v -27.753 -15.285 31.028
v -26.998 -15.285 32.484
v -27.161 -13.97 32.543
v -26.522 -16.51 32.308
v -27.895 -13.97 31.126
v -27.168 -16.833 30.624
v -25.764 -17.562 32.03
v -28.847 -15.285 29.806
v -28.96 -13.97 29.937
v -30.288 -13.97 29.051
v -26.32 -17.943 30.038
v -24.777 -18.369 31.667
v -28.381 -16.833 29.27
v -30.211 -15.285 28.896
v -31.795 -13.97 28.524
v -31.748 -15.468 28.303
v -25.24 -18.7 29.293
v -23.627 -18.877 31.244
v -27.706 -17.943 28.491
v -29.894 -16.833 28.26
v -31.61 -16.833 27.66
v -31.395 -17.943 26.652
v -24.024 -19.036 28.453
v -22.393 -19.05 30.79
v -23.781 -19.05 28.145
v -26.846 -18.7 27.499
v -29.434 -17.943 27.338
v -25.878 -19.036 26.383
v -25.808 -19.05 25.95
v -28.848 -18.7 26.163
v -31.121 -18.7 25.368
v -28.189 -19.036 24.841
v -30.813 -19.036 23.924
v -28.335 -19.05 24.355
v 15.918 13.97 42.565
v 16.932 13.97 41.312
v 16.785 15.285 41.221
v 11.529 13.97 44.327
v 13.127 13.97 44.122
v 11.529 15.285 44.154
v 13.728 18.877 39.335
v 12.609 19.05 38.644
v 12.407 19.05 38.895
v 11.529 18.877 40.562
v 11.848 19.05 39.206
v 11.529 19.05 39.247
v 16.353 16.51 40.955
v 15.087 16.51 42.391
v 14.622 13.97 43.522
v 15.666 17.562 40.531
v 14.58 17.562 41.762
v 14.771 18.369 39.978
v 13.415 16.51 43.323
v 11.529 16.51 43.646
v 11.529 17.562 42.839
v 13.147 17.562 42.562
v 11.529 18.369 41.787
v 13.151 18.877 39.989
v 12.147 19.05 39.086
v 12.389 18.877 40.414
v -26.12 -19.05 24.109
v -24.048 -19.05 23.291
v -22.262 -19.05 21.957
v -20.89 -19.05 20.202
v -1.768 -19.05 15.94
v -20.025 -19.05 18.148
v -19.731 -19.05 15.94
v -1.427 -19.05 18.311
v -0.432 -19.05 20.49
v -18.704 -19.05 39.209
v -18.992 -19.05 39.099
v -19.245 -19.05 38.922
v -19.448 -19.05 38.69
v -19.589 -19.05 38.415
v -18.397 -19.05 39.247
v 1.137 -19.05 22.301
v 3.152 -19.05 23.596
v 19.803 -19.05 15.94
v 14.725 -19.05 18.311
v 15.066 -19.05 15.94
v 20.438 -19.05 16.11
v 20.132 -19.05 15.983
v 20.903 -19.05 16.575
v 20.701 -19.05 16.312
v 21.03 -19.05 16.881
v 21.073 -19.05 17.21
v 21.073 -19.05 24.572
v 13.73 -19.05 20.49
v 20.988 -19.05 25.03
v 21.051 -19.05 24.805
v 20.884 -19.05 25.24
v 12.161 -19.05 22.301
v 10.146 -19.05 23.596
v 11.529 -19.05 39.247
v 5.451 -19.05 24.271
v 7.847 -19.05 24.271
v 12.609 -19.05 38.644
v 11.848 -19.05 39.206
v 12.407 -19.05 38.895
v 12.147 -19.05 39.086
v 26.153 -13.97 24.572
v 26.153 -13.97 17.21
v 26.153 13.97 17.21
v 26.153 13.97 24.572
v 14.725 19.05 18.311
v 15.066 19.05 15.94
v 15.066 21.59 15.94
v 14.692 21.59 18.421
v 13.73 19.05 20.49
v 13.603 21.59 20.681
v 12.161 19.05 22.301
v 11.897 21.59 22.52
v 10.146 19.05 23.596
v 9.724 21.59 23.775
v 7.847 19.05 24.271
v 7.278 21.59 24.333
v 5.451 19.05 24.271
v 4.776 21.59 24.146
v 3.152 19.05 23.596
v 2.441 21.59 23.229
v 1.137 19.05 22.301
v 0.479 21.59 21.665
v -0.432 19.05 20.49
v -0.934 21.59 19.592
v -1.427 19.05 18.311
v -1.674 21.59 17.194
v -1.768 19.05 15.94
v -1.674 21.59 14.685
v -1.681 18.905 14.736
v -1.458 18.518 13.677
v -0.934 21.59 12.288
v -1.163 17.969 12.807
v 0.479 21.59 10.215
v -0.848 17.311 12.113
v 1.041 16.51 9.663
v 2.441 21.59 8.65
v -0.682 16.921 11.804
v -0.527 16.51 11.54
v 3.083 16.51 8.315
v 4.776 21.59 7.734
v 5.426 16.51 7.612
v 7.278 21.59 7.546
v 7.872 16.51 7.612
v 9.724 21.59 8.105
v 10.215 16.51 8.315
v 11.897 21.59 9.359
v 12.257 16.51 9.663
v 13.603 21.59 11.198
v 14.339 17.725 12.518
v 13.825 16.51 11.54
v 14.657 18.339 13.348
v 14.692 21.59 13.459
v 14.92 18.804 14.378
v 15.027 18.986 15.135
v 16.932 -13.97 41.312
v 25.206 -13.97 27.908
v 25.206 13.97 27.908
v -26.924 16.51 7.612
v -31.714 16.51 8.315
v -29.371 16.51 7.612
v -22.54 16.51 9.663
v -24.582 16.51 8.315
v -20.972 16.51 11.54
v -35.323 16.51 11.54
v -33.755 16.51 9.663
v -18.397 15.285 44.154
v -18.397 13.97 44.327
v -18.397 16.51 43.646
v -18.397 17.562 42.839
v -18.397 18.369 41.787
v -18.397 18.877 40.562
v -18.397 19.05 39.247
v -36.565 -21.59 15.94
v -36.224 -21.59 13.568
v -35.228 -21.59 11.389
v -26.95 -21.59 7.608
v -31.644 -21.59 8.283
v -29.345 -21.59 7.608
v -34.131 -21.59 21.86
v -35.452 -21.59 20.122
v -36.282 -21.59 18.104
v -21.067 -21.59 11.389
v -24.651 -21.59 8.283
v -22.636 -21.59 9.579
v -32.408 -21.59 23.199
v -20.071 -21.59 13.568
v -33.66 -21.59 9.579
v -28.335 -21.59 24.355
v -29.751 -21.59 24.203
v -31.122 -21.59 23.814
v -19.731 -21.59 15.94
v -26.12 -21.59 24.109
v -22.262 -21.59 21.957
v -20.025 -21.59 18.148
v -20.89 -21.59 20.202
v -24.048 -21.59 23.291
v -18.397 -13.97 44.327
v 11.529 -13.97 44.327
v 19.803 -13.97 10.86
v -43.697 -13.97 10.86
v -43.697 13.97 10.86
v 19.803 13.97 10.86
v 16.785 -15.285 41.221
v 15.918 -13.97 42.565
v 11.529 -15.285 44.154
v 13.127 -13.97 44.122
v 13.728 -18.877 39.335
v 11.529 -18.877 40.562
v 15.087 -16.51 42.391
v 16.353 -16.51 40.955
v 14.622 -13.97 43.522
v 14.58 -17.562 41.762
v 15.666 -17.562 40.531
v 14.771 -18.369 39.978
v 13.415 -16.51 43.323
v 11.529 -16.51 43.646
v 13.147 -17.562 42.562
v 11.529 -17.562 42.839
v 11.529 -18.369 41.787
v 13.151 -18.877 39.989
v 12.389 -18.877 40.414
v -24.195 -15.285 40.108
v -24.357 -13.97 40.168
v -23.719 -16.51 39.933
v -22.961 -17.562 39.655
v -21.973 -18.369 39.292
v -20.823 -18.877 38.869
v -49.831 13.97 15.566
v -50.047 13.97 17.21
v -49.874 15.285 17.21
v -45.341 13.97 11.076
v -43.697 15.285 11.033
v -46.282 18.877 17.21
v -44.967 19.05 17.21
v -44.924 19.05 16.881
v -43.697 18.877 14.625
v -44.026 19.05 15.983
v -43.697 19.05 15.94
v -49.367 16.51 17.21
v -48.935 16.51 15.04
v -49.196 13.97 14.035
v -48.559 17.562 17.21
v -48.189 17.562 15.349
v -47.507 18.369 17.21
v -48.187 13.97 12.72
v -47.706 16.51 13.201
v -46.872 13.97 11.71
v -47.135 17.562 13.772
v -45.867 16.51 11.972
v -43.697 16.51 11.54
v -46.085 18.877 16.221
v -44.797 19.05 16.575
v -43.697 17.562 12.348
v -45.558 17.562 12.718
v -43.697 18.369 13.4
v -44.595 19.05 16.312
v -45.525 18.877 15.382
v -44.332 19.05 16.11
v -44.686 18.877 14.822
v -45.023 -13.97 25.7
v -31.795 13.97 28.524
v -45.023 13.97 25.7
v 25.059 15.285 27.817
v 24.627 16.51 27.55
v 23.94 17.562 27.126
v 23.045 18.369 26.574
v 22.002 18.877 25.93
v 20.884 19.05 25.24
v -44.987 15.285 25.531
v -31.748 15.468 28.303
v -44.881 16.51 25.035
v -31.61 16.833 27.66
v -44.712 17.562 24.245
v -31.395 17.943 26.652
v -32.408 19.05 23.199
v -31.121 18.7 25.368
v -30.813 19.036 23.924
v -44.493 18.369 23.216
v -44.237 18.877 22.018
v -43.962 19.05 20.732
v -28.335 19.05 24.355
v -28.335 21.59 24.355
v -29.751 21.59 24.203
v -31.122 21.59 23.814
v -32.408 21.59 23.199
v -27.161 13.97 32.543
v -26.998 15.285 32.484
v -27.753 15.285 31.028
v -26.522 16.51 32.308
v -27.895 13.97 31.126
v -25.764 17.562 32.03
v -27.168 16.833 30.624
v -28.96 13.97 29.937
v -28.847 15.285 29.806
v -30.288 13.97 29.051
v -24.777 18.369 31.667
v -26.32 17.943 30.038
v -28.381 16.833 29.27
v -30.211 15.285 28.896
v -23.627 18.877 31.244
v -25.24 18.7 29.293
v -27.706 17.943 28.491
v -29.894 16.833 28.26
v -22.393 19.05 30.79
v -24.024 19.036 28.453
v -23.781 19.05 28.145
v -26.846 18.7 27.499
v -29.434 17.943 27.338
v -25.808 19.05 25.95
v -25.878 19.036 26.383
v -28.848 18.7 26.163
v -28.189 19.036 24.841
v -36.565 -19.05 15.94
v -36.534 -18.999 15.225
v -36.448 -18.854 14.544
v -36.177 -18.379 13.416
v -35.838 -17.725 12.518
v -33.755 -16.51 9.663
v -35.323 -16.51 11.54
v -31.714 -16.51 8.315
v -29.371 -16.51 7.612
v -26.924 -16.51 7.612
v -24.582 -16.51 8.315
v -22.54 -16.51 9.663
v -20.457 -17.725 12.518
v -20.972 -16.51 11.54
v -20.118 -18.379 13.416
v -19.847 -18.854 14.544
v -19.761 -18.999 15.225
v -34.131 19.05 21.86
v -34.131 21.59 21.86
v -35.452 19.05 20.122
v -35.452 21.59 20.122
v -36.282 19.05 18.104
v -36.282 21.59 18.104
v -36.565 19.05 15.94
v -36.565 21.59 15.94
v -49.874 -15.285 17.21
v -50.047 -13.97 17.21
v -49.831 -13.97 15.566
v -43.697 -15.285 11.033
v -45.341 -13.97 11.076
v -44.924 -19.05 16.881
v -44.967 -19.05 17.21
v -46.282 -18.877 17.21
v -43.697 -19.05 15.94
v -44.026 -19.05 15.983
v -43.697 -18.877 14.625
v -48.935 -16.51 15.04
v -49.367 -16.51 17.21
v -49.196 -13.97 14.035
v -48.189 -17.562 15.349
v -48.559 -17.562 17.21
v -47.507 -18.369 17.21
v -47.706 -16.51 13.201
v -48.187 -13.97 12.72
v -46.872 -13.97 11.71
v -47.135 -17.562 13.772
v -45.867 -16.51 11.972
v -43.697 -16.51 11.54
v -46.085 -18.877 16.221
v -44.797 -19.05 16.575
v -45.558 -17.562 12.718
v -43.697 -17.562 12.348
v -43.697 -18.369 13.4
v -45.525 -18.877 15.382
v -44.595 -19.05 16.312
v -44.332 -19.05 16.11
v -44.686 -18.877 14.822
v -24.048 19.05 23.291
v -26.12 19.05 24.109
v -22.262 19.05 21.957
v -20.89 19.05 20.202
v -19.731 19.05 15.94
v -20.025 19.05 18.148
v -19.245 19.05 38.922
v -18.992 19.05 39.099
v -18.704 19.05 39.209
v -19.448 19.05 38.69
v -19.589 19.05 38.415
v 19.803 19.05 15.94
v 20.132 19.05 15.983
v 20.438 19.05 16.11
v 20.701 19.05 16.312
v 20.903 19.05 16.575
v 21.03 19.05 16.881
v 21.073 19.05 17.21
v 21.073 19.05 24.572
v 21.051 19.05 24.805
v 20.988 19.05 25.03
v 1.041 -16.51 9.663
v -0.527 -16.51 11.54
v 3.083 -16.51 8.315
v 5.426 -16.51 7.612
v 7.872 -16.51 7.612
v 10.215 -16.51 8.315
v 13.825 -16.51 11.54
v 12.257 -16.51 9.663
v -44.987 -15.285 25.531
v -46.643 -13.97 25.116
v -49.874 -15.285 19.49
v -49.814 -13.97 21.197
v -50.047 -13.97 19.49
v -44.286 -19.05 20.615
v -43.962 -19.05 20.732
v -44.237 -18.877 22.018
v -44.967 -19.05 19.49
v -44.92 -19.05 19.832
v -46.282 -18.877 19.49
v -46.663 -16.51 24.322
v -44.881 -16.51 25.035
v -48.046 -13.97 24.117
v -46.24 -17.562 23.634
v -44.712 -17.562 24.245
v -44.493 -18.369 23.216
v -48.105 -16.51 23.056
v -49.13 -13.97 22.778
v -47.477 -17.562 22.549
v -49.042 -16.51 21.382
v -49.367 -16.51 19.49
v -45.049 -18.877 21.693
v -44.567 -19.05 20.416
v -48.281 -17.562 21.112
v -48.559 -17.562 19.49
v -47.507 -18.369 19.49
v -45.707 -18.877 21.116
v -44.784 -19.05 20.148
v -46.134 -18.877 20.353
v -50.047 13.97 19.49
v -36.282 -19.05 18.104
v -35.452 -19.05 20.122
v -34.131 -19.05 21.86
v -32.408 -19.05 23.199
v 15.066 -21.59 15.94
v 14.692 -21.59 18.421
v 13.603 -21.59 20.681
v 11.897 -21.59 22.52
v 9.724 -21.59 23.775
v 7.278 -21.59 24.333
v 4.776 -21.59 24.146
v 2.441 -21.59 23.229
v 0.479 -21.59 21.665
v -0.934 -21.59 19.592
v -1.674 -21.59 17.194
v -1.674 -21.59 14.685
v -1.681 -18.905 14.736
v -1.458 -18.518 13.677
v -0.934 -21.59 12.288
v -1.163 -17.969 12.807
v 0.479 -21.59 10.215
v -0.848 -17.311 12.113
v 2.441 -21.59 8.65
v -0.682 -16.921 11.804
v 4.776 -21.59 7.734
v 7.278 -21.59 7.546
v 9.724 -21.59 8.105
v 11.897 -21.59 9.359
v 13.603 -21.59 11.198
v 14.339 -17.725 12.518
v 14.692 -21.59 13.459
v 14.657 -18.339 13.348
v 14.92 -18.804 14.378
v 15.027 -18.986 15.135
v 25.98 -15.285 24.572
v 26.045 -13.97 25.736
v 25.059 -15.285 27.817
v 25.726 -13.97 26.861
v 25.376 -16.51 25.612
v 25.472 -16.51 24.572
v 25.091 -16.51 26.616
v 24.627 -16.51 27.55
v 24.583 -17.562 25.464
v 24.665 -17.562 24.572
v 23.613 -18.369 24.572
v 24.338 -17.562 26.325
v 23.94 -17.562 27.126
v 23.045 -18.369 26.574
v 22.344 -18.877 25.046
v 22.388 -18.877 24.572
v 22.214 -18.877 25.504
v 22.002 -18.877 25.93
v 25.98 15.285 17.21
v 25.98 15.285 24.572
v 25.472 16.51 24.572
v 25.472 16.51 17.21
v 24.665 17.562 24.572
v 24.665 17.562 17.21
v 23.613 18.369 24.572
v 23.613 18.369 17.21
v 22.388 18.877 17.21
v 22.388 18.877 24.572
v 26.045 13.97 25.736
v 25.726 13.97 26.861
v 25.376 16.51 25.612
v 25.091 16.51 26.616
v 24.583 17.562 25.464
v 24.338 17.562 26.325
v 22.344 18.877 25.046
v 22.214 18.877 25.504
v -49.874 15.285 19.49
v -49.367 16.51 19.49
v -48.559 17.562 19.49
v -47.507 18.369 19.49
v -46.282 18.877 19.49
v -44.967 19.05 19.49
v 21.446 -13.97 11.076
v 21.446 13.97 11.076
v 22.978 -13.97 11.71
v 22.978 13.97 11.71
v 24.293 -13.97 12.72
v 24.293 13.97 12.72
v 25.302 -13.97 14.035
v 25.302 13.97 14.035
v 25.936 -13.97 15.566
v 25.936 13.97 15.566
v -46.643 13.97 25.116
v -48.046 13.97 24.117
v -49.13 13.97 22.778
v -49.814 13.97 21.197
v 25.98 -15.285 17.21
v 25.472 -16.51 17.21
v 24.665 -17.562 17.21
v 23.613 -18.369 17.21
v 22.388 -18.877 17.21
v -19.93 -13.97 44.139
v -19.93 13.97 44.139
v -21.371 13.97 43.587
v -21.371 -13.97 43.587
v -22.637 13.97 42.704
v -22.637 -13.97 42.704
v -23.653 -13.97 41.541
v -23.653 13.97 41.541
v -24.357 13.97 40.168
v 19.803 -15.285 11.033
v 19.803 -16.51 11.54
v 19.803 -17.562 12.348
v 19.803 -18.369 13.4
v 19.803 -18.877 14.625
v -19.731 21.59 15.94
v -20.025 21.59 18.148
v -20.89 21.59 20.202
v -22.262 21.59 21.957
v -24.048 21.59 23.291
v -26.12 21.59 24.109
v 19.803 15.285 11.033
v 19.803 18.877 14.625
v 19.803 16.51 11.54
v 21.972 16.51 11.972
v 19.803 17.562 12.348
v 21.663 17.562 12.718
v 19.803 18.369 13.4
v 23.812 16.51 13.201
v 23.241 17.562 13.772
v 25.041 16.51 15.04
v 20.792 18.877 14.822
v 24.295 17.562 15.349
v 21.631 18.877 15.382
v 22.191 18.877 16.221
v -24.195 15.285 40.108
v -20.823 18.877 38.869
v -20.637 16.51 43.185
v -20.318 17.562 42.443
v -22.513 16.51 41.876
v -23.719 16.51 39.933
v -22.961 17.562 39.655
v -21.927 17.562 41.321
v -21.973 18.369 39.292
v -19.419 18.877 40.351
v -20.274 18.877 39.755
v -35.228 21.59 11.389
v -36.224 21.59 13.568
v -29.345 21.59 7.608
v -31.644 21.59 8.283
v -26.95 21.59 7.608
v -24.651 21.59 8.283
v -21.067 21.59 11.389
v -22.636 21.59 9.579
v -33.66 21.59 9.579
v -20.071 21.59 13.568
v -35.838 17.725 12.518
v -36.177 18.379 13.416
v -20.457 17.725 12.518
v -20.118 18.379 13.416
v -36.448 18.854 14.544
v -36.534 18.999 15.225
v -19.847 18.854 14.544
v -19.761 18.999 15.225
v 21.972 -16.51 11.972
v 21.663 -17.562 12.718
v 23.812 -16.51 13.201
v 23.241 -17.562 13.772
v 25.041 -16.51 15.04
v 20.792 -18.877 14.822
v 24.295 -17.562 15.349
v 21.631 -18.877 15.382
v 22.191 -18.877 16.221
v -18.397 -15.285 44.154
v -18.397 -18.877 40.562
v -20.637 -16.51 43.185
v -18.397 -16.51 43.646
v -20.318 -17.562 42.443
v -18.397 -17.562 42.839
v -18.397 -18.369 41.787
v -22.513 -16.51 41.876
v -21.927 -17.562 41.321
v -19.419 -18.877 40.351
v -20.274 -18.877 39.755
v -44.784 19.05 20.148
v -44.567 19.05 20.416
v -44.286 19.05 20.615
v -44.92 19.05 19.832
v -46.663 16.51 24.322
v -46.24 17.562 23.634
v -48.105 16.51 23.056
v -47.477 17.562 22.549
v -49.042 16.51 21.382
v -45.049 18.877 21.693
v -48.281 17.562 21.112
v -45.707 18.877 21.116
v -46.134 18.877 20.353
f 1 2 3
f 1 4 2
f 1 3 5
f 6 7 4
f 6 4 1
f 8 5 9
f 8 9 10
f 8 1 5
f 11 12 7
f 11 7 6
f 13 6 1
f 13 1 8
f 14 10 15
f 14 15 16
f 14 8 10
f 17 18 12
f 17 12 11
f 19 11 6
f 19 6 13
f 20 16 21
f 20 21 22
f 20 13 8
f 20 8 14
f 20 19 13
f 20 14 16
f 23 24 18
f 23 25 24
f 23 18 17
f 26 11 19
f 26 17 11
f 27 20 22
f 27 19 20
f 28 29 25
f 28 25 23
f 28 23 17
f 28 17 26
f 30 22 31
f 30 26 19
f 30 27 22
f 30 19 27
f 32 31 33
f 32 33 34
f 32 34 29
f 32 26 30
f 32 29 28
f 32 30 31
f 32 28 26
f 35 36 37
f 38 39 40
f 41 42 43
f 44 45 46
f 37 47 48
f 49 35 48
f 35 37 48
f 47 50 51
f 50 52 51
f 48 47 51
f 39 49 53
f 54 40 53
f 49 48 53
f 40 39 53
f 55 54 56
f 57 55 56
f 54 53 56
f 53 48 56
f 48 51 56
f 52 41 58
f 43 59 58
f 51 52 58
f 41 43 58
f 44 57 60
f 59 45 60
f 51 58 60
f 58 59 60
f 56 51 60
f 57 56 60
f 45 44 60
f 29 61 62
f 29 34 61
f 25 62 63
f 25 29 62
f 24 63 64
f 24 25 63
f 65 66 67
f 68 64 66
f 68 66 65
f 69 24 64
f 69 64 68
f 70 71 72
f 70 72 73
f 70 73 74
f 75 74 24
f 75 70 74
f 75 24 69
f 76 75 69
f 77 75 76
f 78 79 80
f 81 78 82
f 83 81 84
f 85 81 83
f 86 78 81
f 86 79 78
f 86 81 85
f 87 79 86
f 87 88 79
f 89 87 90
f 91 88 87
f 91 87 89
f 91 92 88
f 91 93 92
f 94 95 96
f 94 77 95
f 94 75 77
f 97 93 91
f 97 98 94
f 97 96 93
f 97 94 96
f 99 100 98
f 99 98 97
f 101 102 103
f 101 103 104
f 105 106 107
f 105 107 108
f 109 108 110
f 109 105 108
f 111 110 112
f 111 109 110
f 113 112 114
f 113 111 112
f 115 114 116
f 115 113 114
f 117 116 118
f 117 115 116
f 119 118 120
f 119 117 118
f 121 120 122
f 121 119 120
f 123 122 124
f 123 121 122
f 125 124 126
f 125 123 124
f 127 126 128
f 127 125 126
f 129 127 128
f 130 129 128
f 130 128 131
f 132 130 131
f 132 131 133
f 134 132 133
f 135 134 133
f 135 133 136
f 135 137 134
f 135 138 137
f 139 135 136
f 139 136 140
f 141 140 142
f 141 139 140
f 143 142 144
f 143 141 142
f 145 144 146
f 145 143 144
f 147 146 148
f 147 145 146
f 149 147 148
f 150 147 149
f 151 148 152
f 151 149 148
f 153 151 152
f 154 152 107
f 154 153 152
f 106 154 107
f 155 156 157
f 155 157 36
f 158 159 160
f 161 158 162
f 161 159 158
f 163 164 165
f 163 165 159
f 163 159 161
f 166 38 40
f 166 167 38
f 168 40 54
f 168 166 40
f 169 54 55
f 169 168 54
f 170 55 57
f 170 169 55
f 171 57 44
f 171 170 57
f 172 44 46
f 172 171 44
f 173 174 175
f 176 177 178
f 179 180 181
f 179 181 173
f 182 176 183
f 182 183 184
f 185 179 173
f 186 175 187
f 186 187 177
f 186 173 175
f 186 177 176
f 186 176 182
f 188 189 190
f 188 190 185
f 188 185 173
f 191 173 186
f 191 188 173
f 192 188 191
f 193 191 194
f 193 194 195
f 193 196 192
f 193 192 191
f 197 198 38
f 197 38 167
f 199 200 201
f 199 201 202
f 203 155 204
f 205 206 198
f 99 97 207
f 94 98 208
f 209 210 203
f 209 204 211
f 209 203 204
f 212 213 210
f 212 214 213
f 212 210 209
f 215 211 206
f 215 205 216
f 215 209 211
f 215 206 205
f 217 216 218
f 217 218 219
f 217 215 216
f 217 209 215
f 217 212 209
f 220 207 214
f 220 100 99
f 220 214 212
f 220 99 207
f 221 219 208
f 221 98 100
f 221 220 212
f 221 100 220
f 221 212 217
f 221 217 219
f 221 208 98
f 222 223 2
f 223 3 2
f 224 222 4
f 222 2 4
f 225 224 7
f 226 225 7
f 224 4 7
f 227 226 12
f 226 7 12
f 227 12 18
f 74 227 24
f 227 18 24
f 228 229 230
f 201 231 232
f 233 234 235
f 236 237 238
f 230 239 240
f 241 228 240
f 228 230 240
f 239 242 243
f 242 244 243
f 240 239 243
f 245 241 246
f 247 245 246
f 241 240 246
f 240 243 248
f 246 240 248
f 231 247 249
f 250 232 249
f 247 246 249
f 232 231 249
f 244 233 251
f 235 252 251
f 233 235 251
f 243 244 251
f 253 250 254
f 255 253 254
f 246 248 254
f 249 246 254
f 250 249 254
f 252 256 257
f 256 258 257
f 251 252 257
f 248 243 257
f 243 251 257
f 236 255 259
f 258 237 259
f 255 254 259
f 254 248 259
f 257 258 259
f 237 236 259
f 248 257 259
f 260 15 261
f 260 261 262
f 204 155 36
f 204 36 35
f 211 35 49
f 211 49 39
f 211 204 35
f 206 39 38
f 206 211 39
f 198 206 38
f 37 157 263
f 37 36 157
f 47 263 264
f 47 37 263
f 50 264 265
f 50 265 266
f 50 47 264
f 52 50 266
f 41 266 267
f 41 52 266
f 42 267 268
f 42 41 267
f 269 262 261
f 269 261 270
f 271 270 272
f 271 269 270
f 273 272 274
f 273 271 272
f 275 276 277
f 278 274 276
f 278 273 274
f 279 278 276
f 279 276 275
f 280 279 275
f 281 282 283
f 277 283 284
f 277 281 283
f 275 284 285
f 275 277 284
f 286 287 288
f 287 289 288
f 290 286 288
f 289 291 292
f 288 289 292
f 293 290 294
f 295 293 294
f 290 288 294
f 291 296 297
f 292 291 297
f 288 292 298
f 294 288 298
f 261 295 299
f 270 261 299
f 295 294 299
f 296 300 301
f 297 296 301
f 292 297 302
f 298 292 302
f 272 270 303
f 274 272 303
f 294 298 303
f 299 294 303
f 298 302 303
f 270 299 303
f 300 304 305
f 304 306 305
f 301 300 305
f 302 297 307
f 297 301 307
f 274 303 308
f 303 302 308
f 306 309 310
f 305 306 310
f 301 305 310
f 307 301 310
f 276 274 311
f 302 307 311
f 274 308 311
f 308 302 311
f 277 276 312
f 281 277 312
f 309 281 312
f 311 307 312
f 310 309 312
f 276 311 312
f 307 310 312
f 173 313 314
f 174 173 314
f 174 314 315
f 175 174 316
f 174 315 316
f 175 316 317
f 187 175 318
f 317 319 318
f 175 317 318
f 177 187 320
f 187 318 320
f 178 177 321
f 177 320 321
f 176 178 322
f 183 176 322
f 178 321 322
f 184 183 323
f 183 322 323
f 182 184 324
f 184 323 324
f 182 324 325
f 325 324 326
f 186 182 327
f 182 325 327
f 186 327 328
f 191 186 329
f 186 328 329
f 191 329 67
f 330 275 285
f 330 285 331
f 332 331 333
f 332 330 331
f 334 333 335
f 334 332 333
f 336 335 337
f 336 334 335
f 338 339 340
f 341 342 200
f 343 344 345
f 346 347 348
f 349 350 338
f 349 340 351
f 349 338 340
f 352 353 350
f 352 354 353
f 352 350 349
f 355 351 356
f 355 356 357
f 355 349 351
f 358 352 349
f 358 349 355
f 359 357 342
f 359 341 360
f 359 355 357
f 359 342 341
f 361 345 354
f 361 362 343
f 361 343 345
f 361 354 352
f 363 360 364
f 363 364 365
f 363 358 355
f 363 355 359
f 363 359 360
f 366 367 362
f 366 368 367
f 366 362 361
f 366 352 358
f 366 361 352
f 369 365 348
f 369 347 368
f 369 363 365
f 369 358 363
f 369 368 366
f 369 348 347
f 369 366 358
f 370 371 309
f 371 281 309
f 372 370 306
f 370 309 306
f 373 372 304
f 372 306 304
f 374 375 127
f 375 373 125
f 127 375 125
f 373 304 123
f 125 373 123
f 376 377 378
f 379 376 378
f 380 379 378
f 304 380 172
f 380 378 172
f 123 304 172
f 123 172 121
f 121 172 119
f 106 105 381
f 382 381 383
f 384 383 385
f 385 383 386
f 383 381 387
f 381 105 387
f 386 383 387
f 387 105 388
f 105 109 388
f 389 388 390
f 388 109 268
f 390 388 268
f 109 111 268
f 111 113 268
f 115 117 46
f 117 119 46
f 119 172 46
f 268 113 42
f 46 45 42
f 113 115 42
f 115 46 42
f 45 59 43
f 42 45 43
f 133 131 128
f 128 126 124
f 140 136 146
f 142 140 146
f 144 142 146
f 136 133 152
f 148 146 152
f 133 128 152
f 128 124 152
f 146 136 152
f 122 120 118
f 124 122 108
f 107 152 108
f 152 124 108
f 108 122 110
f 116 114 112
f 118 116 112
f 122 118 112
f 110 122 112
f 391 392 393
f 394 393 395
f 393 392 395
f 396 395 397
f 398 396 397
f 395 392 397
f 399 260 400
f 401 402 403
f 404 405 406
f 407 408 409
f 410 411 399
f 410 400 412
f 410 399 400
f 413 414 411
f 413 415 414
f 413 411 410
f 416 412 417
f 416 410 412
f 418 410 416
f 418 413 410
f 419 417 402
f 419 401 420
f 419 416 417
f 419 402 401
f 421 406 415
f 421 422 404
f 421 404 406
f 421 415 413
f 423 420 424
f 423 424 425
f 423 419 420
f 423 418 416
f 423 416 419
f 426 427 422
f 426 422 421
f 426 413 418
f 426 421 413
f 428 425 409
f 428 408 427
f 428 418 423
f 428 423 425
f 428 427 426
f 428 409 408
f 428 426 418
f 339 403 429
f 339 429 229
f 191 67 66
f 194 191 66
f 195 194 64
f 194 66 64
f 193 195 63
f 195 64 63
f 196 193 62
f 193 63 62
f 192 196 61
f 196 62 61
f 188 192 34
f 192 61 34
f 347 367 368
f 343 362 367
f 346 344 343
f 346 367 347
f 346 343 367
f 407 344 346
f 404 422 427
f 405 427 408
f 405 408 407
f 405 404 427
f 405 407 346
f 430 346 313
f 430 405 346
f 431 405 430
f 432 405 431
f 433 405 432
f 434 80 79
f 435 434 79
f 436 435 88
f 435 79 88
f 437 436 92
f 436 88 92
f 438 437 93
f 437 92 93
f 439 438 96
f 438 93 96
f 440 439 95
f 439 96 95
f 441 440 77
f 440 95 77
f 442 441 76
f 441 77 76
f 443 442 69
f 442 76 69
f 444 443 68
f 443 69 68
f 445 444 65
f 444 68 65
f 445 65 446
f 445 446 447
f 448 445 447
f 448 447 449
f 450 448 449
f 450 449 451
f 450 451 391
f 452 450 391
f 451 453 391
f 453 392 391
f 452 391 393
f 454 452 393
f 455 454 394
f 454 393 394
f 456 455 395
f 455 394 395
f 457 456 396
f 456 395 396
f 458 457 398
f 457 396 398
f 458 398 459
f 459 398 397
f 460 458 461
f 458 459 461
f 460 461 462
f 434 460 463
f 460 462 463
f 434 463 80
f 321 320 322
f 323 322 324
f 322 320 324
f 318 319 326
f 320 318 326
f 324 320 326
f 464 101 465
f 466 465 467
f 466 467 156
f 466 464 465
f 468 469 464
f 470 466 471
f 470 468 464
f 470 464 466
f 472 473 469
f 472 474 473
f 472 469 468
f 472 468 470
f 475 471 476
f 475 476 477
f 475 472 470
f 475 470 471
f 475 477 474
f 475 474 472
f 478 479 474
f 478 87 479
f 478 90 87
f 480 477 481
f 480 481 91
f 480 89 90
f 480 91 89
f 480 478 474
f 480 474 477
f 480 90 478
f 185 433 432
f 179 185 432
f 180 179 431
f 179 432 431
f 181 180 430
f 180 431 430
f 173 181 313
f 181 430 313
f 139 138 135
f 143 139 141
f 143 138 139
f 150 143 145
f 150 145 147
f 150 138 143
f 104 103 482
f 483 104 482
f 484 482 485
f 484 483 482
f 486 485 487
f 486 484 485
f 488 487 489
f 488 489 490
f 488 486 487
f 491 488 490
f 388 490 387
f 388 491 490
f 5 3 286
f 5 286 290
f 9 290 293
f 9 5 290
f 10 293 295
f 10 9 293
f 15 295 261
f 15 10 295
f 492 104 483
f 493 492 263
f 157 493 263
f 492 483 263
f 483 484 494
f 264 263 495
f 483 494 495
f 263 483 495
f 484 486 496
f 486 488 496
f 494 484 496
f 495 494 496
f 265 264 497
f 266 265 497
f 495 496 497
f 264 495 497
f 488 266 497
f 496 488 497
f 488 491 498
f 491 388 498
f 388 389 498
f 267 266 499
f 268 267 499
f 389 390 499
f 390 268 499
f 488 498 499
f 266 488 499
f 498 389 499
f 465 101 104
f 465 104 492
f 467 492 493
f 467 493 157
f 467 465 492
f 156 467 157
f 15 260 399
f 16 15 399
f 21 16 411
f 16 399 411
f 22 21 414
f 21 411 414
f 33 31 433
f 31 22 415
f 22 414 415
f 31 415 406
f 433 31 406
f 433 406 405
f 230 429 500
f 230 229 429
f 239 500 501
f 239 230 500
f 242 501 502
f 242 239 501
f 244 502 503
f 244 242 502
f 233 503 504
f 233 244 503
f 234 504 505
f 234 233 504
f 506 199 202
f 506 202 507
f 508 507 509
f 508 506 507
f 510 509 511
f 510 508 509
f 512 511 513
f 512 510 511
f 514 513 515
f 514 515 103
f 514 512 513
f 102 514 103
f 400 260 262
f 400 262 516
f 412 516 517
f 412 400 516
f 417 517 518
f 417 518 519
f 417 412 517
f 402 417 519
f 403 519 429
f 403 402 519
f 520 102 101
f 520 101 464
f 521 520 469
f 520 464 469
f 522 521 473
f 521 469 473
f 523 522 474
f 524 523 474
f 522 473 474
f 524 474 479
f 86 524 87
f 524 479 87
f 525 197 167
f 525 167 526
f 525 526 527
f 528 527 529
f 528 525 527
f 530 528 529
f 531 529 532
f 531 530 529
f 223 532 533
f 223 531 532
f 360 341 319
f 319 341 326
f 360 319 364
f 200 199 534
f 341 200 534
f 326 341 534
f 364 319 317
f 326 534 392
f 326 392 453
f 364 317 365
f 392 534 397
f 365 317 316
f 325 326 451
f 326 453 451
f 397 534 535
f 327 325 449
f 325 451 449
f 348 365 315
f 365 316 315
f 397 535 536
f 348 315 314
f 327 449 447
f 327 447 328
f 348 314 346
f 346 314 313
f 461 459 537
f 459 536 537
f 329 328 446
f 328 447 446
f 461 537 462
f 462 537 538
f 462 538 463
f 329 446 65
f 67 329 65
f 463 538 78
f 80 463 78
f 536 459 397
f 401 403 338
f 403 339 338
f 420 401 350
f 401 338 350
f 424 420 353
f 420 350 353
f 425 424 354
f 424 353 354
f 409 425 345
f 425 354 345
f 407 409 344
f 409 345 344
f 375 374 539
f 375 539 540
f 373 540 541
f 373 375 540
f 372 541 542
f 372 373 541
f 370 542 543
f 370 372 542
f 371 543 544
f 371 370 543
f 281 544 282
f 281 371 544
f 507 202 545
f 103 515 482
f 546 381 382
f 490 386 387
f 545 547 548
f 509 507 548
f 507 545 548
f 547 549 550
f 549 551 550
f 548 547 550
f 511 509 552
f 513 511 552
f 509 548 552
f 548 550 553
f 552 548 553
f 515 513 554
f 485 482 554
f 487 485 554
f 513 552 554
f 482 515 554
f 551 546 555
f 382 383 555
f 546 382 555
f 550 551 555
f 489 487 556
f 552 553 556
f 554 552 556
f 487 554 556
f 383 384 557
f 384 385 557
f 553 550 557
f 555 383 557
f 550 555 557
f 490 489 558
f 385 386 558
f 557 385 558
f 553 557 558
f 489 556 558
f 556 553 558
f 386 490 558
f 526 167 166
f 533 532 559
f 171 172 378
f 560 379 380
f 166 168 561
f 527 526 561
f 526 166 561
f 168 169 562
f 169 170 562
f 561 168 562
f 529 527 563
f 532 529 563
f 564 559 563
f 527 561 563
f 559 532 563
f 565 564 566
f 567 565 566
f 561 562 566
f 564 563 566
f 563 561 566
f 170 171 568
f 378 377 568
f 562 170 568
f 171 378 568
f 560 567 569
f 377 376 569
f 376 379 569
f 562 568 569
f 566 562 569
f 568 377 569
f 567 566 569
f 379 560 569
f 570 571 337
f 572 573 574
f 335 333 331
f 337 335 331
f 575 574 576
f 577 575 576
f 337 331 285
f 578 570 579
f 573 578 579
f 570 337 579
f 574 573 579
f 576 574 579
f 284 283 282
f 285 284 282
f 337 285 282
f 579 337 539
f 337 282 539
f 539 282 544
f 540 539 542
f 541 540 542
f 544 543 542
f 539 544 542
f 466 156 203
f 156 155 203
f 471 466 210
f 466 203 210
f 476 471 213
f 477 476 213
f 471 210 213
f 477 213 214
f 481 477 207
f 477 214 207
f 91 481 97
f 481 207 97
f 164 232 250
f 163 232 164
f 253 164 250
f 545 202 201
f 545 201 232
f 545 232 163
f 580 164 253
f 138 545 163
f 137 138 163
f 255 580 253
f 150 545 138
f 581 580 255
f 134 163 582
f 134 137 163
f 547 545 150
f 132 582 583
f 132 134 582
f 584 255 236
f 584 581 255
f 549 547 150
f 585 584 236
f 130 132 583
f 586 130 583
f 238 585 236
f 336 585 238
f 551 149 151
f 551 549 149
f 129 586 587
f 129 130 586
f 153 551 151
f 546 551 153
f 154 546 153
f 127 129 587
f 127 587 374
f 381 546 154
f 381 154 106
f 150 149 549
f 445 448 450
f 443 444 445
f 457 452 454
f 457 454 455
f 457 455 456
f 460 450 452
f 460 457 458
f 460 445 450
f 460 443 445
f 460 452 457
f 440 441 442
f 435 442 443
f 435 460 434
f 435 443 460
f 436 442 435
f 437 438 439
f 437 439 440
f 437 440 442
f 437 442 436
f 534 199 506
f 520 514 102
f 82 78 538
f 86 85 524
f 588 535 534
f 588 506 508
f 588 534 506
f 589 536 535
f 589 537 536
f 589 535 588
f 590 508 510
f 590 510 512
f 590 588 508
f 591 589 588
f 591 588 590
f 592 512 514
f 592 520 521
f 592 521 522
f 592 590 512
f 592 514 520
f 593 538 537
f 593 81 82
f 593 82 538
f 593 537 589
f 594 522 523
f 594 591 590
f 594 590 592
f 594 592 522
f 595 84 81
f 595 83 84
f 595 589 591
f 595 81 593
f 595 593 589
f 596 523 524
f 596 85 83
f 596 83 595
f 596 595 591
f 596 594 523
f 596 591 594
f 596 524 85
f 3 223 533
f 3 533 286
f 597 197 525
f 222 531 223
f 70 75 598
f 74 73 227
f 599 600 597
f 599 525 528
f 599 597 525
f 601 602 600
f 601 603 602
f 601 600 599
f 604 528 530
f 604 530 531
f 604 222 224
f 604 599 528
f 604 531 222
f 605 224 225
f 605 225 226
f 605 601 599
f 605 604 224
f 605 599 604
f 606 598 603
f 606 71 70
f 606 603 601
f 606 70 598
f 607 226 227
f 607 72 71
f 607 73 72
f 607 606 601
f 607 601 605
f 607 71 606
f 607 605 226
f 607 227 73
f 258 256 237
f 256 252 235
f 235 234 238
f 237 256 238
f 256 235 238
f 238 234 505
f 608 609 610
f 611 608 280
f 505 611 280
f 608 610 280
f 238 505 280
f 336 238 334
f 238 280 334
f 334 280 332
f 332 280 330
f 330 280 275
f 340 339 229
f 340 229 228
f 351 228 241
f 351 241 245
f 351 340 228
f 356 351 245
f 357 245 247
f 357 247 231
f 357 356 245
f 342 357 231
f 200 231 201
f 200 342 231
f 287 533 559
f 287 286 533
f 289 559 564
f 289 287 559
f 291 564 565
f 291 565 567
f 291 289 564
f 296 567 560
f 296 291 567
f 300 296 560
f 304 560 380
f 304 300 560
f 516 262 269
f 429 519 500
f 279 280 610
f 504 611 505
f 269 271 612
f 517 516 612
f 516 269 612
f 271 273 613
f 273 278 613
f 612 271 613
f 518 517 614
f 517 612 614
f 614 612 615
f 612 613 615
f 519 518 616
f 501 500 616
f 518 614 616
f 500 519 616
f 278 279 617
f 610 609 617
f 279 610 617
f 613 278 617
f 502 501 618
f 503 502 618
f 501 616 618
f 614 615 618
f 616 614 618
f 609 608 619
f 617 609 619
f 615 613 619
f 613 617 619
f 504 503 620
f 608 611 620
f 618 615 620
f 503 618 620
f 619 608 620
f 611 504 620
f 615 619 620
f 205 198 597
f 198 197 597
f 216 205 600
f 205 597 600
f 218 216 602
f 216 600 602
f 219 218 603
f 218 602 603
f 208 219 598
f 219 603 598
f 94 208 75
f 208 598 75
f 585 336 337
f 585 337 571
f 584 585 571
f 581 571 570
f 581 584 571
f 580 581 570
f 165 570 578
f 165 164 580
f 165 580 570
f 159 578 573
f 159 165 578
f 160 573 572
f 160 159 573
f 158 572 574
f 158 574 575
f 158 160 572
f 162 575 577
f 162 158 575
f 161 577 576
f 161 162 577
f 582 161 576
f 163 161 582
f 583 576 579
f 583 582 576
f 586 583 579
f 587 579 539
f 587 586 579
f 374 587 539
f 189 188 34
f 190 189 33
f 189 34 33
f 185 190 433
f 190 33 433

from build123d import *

# Parameters (mm, degrees)
F1_DEPTH = 19.05
F2_R     = 5.08
F4_DEPTH = 2.54


with BuildPart() as f1:
    # F0 (on Front) → F1 (new body, symmetric)
    with BuildSketch(Plane.XZ):
        with BuildLine():
            Line((-31.7947502343, 28.5244368225), (-45.0228915296, 25.7004508864))
            ThreePointArc((-45.0228915296, 25.7004508864), (-48.6337945871, 23.4843832577), (-50.0471470773, 19.4903863419))
            Line((-50.0471470773, 19.4903863419), (-50.0471470773, 17.209751375))
            ThreePointArc((-50.0471470773, 17.209751375), (-48.1872751379, 12.7196233145), (-43.6971470773, 10.859751375))
            Line((-43.6971470773, 10.859751375), (19.8028529227, 10.859751375))
            ThreePointArc((19.8028529227, 10.859751375), (24.2929809832, 12.7196233145), (26.1528529227, 17.209751375))
            Line((26.1528529227, 17.209751375), (26.1528529227, 24.5724479892))
            ThreePointArc((26.1528529227, 24.5724479892), (25.9116323119, 26.3060322456), (25.2062972144, 27.9079074459))
            Line((25.2062972144, 27.9079074459), (16.9319615885, 41.3123310901))
            ThreePointArc((16.9319615885, 41.3123310901), (14.6222474443, 43.5222601478), (11.5285172969, 44.3268716335))
            Line((11.5285172969, 44.3268716335), (-18.3973462303, 44.3268716335))
            ThreePointArc((-18.3973462303, 44.3268716335), (-22.0311174702, 43.1843860671), (-24.3573198303, 40.168039059))
            Line((-24.3573198303, 40.168039059), (-27.1605210865, 32.5433339416))
            ThreePointArc((-27.1605210865, 32.5433339416), (-28.9601695313, 29.9371901824), (-31.7947502343, 28.5244368225))
        make_face()
    extrude(amount=F1_DEPTH, both=True)

    # F2
    f2_edges = [f1.edges().sort_by_distance(p)[0] for p in [
        (-3.434414, -19.05, 44.326872),
        (-3.434414, 19.05, 44.326872),
    ]]
    fillet(f2_edges, radius=F2_R)

    # F3 (on face) → F4 (join, symmetric)
    with BuildSketch(Plane.XZ.offset(19.05)):
        with BuildLine():
            Line((15.0660514035, 15.939751375), (-1.7679906585, 15.939751375))
            ThreePointArc((-1.7679906585, 15.939751375), (6.6490303725, 7.522730344), (15.0660514035, 15.939751375))
        make_face()
        with BuildLine():
            ThreePointArc((15.0660514035, 15.939751375), (6.6490303725, 24.356772406), (-1.7679906585, 15.939751375))
            Line((-1.7679906585, 15.939751375), (15.0660514035, 15.939751375))
        make_face()
        with BuildLine():
            Line((-36.5645825066, 15.939751375), (-19.7305404446, 15.939751375))
            ThreePointArc((-19.7305404446, 15.939751375), (-22.2623397644, 21.9572598666), (-28.3346316813, 24.3546933103))
            ThreePointArc((-28.3346316813, 24.3546933103), (-29.5122474663, 23.8889745473), (-30.7341546725, 23.5563851869))
            Line((-30.7341546725, 23.5563851869), (-32.4075441475, 23.1991446466))
            ThreePointArc((-32.4075441475, 23.1991446466), (-35.451759131, 20.1224466362), (-36.5645825066, 15.939751375))
        make_face()
        with BuildLine():
            ThreePointArc((-30.7341546725, 23.5563851869), (-29.5122474663, 23.8889745473), (-28.3346316813, 24.3546933103))
            ThreePointArc((-28.3346316813, 24.3546933103), (-30.444928012, 24.0371799813), (-32.4075441475, 23.1991446466))
            Line((-32.4075441475, 23.1991446466), (-30.7341546725, 23.5563851869))
        make_face()
        with BuildLine():
            ThreePointArc((-36.5645825066, 15.939751375), (-28.1475614756, 7.522730344), (-19.7305404446, 15.939751375))
            Line((-19.7305404446, 15.939751375), (-36.5645825066, 15.939751375))
        make_face()
    extrude(amount=F4_DEPTH, both=True)

    # F5: F1 across plane


with BuildPart() as f1_1:
    add(f1.part)
    add(f1.part.mirror(Plane.XZ))


solid = f1_1.part
